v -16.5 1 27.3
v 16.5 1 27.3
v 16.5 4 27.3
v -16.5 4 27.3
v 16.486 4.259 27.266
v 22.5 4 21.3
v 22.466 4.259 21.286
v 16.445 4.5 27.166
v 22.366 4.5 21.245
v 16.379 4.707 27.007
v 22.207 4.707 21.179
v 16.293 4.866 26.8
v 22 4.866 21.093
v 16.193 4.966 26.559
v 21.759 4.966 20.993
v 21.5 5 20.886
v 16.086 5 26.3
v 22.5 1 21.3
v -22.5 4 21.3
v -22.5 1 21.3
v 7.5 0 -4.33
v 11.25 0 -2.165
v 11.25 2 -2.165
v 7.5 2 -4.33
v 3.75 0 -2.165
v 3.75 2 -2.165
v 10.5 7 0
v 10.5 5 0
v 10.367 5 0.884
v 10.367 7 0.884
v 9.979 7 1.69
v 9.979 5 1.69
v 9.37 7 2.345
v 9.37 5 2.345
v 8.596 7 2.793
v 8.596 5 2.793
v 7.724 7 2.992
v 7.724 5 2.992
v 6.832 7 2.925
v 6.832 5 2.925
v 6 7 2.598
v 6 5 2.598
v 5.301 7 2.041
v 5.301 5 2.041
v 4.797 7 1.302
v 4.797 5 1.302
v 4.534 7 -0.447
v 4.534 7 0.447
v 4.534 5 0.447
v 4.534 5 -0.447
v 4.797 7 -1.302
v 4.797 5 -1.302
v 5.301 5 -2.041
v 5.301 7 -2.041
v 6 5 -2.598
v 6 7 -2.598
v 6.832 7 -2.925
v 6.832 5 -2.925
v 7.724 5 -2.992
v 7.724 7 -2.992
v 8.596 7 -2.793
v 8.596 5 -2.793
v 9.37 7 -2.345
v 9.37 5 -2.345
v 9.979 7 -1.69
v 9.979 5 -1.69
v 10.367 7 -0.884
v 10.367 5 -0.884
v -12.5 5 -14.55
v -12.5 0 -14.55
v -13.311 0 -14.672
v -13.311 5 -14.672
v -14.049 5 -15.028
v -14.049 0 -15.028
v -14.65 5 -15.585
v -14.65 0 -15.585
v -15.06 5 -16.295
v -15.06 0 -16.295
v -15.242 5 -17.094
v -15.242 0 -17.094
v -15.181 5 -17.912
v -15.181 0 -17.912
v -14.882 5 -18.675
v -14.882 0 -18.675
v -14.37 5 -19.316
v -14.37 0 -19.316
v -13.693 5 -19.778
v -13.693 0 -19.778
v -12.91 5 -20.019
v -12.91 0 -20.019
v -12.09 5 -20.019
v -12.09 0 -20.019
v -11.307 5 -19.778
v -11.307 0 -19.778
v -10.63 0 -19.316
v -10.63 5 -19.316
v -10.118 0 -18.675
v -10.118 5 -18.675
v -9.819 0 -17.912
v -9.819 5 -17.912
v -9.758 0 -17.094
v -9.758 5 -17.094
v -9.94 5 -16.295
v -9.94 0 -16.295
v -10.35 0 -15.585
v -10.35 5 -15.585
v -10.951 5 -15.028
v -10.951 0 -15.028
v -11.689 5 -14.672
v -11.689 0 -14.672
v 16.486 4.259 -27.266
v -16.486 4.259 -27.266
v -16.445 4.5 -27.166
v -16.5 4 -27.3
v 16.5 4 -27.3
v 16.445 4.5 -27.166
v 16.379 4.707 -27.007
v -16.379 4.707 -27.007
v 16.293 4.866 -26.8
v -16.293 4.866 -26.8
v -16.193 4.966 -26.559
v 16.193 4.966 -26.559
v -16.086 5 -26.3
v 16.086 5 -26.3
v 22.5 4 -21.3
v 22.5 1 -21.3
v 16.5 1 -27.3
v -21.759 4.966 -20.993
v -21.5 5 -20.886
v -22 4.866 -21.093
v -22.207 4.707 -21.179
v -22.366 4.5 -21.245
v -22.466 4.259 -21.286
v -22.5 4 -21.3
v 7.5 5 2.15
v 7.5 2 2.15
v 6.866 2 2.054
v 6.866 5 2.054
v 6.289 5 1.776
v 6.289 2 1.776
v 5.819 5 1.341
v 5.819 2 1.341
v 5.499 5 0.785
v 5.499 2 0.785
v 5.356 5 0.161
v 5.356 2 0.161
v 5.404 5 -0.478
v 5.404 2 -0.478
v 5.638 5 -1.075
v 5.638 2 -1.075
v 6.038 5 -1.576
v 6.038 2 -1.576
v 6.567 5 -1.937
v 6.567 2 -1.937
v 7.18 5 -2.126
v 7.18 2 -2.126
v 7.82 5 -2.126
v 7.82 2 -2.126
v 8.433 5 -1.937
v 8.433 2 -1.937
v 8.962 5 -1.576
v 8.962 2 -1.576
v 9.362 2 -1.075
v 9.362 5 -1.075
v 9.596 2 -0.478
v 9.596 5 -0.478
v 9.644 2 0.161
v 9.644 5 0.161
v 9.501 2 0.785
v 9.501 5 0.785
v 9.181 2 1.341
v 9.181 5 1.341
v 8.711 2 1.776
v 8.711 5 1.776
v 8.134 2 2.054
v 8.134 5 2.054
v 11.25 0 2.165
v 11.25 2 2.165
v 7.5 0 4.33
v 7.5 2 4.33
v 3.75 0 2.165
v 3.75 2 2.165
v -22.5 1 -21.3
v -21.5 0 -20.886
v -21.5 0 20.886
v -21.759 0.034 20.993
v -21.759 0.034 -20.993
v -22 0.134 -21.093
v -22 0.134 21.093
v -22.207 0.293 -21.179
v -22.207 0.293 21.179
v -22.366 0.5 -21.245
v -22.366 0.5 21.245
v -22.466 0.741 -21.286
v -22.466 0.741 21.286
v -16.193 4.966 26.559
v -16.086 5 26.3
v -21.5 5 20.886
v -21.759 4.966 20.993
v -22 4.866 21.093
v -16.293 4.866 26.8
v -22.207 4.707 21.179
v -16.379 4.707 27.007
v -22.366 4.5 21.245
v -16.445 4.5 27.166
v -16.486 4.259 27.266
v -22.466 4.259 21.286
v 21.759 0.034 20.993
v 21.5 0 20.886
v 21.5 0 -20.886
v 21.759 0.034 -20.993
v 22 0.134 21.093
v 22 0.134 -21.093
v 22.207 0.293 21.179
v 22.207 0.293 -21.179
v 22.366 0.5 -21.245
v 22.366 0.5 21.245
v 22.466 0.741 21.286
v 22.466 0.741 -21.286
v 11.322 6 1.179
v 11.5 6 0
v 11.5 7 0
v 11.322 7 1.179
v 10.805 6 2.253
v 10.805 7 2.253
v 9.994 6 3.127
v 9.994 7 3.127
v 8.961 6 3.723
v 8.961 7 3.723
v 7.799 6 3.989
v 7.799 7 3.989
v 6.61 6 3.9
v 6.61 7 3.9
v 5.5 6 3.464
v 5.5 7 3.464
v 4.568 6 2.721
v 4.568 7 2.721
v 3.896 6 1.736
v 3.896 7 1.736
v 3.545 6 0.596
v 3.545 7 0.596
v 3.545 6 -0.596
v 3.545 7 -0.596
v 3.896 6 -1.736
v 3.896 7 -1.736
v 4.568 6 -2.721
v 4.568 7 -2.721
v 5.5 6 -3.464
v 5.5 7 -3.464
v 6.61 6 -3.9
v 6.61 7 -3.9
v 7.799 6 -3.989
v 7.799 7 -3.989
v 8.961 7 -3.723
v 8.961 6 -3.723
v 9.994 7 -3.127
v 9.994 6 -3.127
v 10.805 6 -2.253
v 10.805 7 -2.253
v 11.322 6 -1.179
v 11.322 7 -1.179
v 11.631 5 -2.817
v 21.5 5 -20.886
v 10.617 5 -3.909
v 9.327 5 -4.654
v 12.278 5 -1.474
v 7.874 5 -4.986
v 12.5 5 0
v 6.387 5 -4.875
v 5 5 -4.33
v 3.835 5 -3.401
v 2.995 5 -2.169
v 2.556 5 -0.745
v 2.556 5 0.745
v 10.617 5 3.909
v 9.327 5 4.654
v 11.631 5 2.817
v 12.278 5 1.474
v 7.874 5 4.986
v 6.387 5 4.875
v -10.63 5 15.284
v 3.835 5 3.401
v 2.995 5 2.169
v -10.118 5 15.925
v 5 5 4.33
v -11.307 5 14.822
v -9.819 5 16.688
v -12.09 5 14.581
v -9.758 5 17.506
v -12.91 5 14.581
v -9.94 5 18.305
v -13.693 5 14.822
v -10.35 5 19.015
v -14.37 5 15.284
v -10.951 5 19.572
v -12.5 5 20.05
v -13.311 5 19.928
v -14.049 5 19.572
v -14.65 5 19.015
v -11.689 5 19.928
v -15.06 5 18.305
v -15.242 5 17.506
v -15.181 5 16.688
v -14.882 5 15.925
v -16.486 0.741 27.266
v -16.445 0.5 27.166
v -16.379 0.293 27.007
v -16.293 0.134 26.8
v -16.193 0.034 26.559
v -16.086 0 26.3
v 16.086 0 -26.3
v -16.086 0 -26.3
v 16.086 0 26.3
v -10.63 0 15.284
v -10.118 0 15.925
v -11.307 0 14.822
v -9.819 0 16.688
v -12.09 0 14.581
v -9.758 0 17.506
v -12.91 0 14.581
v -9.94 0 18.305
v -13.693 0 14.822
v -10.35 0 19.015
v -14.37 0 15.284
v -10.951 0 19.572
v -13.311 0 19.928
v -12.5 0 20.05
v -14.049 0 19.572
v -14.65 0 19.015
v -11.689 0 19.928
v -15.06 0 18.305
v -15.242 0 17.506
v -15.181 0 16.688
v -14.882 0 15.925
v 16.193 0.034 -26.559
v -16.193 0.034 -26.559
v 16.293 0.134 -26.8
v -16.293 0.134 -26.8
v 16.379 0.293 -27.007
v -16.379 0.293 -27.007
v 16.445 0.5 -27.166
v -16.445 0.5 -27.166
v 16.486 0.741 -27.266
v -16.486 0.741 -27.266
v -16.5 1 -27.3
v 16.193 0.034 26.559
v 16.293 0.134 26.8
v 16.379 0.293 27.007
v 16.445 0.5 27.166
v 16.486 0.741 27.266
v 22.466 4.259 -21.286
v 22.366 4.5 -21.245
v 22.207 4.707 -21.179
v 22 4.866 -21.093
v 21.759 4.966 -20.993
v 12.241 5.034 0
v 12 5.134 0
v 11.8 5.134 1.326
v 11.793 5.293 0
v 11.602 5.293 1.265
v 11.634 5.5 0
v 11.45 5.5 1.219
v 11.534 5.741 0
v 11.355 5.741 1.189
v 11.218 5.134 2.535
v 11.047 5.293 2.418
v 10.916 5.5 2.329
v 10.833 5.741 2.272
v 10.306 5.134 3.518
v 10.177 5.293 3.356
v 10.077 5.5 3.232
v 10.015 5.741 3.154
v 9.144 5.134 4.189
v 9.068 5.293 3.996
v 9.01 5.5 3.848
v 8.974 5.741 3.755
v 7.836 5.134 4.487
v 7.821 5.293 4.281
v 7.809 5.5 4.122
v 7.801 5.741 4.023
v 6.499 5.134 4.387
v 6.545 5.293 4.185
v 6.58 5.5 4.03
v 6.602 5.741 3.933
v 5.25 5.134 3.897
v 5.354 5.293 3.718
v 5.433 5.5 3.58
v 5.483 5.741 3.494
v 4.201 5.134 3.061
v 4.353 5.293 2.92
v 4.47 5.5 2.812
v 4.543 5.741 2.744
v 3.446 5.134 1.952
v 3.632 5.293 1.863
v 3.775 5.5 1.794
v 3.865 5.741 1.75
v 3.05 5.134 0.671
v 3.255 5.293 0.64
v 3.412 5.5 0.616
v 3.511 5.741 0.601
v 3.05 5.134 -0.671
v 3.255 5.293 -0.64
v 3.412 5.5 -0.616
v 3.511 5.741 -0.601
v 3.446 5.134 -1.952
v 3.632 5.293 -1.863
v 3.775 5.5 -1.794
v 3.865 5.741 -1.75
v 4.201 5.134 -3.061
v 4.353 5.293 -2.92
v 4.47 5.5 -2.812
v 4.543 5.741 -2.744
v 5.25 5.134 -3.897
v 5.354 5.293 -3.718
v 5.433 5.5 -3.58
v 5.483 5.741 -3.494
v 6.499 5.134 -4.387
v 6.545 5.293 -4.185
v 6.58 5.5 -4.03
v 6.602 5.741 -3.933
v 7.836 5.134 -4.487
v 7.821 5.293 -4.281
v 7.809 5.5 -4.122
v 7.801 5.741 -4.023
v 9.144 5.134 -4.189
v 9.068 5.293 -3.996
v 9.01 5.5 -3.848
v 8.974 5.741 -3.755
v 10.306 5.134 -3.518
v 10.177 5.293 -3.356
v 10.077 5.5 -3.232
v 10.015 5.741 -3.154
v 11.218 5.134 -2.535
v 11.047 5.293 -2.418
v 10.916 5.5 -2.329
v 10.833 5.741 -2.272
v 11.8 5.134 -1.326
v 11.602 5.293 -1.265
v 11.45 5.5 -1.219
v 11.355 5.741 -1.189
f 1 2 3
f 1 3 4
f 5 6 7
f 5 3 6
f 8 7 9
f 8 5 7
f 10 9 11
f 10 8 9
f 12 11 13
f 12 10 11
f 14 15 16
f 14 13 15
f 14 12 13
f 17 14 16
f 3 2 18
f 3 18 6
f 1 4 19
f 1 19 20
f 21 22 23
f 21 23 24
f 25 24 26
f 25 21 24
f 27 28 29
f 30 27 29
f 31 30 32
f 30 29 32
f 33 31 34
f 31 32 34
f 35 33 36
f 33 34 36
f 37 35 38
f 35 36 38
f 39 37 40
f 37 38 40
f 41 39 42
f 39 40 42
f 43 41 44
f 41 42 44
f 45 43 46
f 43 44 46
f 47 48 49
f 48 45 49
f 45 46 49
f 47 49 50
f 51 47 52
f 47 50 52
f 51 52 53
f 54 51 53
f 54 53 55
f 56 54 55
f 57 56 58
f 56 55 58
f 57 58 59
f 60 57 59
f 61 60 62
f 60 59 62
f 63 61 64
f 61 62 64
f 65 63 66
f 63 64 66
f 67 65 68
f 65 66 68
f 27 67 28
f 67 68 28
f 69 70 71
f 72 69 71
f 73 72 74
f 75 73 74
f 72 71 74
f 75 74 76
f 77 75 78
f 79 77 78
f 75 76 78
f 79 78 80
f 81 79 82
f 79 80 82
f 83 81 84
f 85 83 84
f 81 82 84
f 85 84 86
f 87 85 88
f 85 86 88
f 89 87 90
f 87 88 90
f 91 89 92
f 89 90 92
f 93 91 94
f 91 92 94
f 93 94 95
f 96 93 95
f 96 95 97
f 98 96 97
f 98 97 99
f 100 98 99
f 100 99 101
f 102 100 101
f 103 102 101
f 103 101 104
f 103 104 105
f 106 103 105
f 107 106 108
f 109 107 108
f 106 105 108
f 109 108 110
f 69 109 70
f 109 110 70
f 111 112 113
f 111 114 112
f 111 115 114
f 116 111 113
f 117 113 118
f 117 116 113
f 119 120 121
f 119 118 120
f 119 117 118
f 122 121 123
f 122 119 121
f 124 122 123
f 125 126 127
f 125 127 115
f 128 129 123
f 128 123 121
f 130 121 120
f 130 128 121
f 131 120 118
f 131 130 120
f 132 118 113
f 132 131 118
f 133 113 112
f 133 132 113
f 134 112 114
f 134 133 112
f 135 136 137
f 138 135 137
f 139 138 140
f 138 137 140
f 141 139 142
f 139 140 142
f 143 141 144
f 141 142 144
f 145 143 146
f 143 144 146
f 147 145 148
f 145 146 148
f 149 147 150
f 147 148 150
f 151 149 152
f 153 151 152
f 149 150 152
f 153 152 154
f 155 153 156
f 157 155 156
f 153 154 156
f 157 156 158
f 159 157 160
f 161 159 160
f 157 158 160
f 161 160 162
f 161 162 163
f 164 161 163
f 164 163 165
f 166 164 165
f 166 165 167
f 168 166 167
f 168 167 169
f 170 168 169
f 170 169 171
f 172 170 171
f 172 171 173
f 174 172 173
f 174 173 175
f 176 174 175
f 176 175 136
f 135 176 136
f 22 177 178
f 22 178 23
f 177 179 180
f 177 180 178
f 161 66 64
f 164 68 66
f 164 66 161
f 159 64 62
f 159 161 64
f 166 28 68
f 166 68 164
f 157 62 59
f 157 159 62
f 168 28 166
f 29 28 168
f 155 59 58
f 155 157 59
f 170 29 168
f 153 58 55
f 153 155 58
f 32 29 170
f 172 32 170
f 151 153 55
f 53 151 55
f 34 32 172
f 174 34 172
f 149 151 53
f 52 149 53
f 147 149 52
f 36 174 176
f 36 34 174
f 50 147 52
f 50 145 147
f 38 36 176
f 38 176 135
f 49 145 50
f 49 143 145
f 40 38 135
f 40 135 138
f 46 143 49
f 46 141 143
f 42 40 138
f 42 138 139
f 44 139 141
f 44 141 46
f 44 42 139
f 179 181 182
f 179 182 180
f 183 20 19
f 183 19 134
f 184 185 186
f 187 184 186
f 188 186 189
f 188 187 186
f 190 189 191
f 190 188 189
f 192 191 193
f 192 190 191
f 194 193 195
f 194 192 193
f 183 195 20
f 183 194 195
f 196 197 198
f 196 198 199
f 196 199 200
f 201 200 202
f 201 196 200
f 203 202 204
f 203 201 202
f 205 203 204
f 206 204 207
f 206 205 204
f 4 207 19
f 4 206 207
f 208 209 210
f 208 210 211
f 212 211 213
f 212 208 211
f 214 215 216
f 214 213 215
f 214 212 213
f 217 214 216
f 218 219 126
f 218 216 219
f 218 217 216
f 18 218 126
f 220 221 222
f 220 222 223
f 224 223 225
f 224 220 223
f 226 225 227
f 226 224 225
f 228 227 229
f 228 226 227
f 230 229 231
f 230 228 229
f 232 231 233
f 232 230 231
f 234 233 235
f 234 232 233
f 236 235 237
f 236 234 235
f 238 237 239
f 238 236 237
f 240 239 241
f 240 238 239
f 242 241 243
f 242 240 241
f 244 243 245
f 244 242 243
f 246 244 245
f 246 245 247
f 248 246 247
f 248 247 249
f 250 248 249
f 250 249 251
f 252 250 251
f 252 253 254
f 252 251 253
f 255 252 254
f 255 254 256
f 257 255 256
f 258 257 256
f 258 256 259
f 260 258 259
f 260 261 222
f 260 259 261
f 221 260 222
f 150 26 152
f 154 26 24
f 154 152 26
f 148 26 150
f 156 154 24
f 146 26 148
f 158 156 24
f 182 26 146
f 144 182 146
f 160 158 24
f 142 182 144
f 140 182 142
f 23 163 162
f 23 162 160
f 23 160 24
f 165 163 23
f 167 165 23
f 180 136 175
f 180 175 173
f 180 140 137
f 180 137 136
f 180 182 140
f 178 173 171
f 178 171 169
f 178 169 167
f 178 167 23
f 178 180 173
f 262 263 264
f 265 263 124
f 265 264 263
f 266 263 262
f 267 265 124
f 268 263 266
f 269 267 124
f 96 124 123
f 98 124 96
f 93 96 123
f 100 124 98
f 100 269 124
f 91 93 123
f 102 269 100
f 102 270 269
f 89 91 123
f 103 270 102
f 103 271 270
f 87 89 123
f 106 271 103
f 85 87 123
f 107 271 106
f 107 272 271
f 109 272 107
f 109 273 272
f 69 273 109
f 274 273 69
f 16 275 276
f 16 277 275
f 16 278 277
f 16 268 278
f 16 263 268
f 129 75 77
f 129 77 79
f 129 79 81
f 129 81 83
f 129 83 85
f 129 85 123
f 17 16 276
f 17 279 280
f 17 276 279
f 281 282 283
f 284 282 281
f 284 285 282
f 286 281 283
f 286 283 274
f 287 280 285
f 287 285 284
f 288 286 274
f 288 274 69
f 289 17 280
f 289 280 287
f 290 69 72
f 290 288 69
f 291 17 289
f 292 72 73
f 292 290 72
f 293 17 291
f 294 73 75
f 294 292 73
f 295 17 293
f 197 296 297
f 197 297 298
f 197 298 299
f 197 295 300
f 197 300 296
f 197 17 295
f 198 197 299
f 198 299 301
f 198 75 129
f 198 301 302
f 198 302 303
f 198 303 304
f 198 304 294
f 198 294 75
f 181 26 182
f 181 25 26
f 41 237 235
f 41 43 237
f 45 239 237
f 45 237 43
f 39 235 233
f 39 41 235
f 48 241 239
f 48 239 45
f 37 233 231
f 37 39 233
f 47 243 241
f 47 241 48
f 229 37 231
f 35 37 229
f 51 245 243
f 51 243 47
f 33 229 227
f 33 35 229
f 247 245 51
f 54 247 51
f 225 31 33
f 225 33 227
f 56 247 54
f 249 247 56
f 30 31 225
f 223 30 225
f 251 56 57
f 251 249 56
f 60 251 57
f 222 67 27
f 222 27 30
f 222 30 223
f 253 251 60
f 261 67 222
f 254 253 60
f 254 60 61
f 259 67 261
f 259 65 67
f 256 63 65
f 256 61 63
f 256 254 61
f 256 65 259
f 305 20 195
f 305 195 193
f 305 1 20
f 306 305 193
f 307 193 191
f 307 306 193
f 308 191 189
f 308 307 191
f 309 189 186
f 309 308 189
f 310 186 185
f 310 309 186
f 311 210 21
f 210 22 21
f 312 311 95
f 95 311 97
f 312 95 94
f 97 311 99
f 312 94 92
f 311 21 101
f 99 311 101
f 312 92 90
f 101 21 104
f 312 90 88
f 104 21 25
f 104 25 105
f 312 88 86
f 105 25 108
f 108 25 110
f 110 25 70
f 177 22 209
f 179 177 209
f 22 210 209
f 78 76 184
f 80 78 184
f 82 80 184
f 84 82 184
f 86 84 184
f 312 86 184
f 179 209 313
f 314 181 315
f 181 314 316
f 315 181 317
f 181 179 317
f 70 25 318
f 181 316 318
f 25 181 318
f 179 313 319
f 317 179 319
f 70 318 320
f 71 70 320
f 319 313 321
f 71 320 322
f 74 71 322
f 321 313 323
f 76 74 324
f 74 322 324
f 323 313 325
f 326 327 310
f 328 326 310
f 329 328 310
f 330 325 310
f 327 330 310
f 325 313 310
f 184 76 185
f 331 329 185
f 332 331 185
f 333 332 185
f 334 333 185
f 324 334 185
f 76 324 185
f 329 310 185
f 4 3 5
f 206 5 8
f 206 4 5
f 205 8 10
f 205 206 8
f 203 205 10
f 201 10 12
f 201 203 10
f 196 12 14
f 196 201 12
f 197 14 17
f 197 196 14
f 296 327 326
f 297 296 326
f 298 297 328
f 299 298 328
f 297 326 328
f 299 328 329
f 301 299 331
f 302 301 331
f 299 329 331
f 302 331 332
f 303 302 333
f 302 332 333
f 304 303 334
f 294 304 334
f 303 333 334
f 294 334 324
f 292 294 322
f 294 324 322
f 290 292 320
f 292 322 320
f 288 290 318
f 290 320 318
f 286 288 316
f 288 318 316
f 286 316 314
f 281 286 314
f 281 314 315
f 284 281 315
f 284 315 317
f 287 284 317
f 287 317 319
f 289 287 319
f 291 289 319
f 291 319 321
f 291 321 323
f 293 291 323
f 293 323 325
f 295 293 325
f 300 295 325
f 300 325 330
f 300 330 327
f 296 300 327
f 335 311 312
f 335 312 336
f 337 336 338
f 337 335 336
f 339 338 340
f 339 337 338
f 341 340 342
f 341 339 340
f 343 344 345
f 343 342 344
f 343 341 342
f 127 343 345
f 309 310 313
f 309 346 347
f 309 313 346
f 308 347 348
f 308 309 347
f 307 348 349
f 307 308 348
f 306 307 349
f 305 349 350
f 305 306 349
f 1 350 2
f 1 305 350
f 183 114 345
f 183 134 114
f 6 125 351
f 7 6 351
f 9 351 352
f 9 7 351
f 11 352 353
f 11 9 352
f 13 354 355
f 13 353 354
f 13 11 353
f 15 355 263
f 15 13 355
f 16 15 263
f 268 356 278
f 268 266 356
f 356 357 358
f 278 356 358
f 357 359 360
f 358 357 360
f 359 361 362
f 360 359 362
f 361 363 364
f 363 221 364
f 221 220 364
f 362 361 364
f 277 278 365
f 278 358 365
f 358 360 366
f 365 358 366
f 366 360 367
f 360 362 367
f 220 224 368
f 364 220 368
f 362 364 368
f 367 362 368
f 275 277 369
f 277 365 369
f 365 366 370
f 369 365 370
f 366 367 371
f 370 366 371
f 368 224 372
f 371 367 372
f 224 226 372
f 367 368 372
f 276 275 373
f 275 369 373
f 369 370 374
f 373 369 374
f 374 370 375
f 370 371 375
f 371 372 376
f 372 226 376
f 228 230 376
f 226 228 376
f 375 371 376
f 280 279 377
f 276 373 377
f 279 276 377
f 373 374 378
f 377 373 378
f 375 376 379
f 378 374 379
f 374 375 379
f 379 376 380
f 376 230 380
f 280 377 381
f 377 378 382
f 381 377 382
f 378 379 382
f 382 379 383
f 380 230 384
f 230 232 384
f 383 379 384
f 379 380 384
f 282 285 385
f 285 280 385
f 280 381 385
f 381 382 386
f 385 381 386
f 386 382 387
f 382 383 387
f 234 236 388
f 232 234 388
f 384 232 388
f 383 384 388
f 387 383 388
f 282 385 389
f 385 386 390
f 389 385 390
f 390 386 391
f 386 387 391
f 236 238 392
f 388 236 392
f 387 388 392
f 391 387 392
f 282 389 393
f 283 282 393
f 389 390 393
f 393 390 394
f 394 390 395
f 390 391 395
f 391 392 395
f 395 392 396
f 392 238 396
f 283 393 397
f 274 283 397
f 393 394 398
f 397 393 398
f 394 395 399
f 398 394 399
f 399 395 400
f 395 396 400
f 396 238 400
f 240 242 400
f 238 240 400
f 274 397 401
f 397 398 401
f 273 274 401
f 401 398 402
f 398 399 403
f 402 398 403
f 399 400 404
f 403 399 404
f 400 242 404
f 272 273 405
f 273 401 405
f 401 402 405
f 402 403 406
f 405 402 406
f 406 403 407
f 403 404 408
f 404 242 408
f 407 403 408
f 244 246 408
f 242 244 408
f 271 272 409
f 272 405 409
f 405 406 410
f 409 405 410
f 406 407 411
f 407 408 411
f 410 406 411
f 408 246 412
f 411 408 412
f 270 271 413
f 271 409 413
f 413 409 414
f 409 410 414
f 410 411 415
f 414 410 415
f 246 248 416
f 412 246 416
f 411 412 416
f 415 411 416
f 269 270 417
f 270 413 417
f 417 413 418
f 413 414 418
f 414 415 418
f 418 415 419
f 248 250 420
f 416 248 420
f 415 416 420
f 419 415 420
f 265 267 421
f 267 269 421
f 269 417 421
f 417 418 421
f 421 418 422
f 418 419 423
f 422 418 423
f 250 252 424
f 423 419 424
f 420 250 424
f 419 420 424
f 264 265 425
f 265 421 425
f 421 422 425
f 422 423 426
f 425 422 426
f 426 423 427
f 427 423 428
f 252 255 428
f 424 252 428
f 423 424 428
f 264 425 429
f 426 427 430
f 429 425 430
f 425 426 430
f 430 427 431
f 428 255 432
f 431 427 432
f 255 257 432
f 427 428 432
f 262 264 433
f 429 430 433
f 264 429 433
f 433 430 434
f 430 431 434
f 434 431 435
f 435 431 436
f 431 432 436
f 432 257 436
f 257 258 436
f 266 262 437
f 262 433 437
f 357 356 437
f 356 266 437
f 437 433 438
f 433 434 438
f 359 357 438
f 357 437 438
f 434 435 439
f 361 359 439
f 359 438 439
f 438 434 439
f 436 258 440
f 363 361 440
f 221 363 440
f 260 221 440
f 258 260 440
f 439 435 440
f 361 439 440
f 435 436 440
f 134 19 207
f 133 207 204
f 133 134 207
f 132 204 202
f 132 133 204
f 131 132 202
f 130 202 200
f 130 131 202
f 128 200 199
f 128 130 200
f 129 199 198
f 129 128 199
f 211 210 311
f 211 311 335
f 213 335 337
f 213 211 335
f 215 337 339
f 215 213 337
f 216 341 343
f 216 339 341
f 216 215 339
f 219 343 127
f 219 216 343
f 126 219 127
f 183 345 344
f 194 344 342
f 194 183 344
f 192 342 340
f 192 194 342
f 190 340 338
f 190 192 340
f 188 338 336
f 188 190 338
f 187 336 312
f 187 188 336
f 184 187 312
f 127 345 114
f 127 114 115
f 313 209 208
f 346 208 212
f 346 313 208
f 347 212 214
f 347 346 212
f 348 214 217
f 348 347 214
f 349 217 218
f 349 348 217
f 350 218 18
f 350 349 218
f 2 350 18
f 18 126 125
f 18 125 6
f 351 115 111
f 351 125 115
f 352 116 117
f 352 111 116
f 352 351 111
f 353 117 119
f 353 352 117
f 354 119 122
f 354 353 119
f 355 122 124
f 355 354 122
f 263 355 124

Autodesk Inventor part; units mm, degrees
ref_plane "YZ Plane" through (0, 0, 0) normal (1, 0, 0) x (0, 1, 0)
ref_plane "XZ Plane" through (0, 0, 0) normal (0, 1, 0) x (-1, 0, 0)
ref_plane "XY Plane" through (0, 0, 0) normal (0, 0, 1) x (1, 0, 0)
sketch "スケッチ1" plane through (0, 0, 0) normal (0, 1, 0) x (-1, 0, 0)
  line L0 (22.5, -27.3) -> (-22.5, -27.3)
  line L1 (-22.5, -27.3) -> (-22.5, 27.3)
  line L2 (-22.5, 27.3) -> (22.5, 27.3)
  line L3 (22.5, 27.3) -> (22.5, -27.3)
  line L4 (22.5, -27.3) -> (-22.5, 27.3) construction
  line L5 (-22.5, -27.3) -> (22.5, 27.3) construction
  point P0 (0, 0)
  dimension "d0" = 45
  dimension "d1" = 54.6
extrude "押し出し1" add sketch "スケッチ1" along normal blind 5
sketch "スケッチ2" plane through (0, 5, 0) normal (0, 1, 0) x (1, 0, 0)
  line L0 (-22.5, 27.3) -> (-22.5, -27.3) projected
  line L1 (-22.5, -27.3) -> (22.5, -27.3) projected
  line L2 (22.5, 27.3) -> (-22.5, 27.3) projected
  point P0 (0, 0)
  point P1 (-12.5, -17.3)
  point P2 (-12.5, 17.3)
  dimension "d4" = 10
  dimension "d5" = 10
  dimension "d6" = 10
hole "穴1" at (-12.5, 5, 17.3) at (-12.5, 5, -17.3) direction (0, -1, 0) diameter 5.5 end through all clearance for "Flat Head Machine Screw" size "M5" standard "Ansi Metric M Profile"
chamfer "面取り1" distance 6 angle 45 4 edges at (22.5, 2.5, -27.3) (22.5, 2.5, 27.3) (-22.5, 2.5, -27.3) (-22.5, 2.5, 27.3)
sketch "スケッチ5" plane through (0, 5, 0) normal (0, 1, 0) x (1, 0, 0)
  circle A0 centre (-12.5, -17.3) radius 2.75 projected
  point P0 (0, 0)
  point P1 (7.5, 0)
  dimension "d43" = 20
hole "穴2" at (7.5, 5, 0) direction (0, -1, 0) diameter 4.3 end through all clearance for "Flat Head Machine Screw" size "M4" standard "Ansi Metric M Profile"
sketch "スケッチ6" plane through (0, 5, 0) normal (0, 1, 0) x (1, 0, 0)
  circle A0 centre (7.5, 0) radius 2.15 projected
  circle A1 centre (7.5, 0) radius 3
  circle A2 centre (7.5, 0) radius 4
  point P0 (0, 0)
  dimension "d51" = 6
  dimension "d52" = 8
extrude "押し出し4" add sketch "スケッチ6" along normal blind 2 contours A2
fillet "フィレット1" radius 1 1 edges at (3.5, 5, 0)
sketch "スケッチ7" plane through (0, 0, 0) normal (0, -1, 0) x (1, 0, 0)
  circle A0 centre (7.5, 0) radius 2.15 projected
  line L0 (7.5, -4.3301) -> (3.75, -2.1651)
  line L1 (3.75, -2.1651) -> (3.75, 2.1651)
  line L2 (3.75, 2.1651) -> (7.5, 4.3301)
  line L3 (7.5, 4.3301) -> (11.25, 2.1651)
  line L4 (11.25, 2.1651) -> (11.25, -2.1651)
  line L5 (11.25, -2.1651) -> (7.5, -4.3301)
  point P0 (0, 0)
  dimension "d56" = 7.5
extrude "押し出し5" cut sketch "スケッチ7" against normal blind 2
fillet "フィレット2" radius 1 16 edges at (-22.5, 5, 0) (-19.5, 5, 24.3) (0, 5, 27.3) (19.5, 5, 24.3) (22.5, 5, 0) (19.5, 5, -24.3) (0, 5, -27.3) (-19.5, 5, -24.3) (0, 0, -27.3) (-19.5, 0, -24.3) (19.5, 0, -24.3) (22.5, 0, 0) (19.5, 0, 24.3) (0, 0, 27.3) (-19.5, 0, 24.3) (-22.5, 0, 0)
equation "\"d6\" = d5"
properties part number "base1" material "ABS プラスチック"
